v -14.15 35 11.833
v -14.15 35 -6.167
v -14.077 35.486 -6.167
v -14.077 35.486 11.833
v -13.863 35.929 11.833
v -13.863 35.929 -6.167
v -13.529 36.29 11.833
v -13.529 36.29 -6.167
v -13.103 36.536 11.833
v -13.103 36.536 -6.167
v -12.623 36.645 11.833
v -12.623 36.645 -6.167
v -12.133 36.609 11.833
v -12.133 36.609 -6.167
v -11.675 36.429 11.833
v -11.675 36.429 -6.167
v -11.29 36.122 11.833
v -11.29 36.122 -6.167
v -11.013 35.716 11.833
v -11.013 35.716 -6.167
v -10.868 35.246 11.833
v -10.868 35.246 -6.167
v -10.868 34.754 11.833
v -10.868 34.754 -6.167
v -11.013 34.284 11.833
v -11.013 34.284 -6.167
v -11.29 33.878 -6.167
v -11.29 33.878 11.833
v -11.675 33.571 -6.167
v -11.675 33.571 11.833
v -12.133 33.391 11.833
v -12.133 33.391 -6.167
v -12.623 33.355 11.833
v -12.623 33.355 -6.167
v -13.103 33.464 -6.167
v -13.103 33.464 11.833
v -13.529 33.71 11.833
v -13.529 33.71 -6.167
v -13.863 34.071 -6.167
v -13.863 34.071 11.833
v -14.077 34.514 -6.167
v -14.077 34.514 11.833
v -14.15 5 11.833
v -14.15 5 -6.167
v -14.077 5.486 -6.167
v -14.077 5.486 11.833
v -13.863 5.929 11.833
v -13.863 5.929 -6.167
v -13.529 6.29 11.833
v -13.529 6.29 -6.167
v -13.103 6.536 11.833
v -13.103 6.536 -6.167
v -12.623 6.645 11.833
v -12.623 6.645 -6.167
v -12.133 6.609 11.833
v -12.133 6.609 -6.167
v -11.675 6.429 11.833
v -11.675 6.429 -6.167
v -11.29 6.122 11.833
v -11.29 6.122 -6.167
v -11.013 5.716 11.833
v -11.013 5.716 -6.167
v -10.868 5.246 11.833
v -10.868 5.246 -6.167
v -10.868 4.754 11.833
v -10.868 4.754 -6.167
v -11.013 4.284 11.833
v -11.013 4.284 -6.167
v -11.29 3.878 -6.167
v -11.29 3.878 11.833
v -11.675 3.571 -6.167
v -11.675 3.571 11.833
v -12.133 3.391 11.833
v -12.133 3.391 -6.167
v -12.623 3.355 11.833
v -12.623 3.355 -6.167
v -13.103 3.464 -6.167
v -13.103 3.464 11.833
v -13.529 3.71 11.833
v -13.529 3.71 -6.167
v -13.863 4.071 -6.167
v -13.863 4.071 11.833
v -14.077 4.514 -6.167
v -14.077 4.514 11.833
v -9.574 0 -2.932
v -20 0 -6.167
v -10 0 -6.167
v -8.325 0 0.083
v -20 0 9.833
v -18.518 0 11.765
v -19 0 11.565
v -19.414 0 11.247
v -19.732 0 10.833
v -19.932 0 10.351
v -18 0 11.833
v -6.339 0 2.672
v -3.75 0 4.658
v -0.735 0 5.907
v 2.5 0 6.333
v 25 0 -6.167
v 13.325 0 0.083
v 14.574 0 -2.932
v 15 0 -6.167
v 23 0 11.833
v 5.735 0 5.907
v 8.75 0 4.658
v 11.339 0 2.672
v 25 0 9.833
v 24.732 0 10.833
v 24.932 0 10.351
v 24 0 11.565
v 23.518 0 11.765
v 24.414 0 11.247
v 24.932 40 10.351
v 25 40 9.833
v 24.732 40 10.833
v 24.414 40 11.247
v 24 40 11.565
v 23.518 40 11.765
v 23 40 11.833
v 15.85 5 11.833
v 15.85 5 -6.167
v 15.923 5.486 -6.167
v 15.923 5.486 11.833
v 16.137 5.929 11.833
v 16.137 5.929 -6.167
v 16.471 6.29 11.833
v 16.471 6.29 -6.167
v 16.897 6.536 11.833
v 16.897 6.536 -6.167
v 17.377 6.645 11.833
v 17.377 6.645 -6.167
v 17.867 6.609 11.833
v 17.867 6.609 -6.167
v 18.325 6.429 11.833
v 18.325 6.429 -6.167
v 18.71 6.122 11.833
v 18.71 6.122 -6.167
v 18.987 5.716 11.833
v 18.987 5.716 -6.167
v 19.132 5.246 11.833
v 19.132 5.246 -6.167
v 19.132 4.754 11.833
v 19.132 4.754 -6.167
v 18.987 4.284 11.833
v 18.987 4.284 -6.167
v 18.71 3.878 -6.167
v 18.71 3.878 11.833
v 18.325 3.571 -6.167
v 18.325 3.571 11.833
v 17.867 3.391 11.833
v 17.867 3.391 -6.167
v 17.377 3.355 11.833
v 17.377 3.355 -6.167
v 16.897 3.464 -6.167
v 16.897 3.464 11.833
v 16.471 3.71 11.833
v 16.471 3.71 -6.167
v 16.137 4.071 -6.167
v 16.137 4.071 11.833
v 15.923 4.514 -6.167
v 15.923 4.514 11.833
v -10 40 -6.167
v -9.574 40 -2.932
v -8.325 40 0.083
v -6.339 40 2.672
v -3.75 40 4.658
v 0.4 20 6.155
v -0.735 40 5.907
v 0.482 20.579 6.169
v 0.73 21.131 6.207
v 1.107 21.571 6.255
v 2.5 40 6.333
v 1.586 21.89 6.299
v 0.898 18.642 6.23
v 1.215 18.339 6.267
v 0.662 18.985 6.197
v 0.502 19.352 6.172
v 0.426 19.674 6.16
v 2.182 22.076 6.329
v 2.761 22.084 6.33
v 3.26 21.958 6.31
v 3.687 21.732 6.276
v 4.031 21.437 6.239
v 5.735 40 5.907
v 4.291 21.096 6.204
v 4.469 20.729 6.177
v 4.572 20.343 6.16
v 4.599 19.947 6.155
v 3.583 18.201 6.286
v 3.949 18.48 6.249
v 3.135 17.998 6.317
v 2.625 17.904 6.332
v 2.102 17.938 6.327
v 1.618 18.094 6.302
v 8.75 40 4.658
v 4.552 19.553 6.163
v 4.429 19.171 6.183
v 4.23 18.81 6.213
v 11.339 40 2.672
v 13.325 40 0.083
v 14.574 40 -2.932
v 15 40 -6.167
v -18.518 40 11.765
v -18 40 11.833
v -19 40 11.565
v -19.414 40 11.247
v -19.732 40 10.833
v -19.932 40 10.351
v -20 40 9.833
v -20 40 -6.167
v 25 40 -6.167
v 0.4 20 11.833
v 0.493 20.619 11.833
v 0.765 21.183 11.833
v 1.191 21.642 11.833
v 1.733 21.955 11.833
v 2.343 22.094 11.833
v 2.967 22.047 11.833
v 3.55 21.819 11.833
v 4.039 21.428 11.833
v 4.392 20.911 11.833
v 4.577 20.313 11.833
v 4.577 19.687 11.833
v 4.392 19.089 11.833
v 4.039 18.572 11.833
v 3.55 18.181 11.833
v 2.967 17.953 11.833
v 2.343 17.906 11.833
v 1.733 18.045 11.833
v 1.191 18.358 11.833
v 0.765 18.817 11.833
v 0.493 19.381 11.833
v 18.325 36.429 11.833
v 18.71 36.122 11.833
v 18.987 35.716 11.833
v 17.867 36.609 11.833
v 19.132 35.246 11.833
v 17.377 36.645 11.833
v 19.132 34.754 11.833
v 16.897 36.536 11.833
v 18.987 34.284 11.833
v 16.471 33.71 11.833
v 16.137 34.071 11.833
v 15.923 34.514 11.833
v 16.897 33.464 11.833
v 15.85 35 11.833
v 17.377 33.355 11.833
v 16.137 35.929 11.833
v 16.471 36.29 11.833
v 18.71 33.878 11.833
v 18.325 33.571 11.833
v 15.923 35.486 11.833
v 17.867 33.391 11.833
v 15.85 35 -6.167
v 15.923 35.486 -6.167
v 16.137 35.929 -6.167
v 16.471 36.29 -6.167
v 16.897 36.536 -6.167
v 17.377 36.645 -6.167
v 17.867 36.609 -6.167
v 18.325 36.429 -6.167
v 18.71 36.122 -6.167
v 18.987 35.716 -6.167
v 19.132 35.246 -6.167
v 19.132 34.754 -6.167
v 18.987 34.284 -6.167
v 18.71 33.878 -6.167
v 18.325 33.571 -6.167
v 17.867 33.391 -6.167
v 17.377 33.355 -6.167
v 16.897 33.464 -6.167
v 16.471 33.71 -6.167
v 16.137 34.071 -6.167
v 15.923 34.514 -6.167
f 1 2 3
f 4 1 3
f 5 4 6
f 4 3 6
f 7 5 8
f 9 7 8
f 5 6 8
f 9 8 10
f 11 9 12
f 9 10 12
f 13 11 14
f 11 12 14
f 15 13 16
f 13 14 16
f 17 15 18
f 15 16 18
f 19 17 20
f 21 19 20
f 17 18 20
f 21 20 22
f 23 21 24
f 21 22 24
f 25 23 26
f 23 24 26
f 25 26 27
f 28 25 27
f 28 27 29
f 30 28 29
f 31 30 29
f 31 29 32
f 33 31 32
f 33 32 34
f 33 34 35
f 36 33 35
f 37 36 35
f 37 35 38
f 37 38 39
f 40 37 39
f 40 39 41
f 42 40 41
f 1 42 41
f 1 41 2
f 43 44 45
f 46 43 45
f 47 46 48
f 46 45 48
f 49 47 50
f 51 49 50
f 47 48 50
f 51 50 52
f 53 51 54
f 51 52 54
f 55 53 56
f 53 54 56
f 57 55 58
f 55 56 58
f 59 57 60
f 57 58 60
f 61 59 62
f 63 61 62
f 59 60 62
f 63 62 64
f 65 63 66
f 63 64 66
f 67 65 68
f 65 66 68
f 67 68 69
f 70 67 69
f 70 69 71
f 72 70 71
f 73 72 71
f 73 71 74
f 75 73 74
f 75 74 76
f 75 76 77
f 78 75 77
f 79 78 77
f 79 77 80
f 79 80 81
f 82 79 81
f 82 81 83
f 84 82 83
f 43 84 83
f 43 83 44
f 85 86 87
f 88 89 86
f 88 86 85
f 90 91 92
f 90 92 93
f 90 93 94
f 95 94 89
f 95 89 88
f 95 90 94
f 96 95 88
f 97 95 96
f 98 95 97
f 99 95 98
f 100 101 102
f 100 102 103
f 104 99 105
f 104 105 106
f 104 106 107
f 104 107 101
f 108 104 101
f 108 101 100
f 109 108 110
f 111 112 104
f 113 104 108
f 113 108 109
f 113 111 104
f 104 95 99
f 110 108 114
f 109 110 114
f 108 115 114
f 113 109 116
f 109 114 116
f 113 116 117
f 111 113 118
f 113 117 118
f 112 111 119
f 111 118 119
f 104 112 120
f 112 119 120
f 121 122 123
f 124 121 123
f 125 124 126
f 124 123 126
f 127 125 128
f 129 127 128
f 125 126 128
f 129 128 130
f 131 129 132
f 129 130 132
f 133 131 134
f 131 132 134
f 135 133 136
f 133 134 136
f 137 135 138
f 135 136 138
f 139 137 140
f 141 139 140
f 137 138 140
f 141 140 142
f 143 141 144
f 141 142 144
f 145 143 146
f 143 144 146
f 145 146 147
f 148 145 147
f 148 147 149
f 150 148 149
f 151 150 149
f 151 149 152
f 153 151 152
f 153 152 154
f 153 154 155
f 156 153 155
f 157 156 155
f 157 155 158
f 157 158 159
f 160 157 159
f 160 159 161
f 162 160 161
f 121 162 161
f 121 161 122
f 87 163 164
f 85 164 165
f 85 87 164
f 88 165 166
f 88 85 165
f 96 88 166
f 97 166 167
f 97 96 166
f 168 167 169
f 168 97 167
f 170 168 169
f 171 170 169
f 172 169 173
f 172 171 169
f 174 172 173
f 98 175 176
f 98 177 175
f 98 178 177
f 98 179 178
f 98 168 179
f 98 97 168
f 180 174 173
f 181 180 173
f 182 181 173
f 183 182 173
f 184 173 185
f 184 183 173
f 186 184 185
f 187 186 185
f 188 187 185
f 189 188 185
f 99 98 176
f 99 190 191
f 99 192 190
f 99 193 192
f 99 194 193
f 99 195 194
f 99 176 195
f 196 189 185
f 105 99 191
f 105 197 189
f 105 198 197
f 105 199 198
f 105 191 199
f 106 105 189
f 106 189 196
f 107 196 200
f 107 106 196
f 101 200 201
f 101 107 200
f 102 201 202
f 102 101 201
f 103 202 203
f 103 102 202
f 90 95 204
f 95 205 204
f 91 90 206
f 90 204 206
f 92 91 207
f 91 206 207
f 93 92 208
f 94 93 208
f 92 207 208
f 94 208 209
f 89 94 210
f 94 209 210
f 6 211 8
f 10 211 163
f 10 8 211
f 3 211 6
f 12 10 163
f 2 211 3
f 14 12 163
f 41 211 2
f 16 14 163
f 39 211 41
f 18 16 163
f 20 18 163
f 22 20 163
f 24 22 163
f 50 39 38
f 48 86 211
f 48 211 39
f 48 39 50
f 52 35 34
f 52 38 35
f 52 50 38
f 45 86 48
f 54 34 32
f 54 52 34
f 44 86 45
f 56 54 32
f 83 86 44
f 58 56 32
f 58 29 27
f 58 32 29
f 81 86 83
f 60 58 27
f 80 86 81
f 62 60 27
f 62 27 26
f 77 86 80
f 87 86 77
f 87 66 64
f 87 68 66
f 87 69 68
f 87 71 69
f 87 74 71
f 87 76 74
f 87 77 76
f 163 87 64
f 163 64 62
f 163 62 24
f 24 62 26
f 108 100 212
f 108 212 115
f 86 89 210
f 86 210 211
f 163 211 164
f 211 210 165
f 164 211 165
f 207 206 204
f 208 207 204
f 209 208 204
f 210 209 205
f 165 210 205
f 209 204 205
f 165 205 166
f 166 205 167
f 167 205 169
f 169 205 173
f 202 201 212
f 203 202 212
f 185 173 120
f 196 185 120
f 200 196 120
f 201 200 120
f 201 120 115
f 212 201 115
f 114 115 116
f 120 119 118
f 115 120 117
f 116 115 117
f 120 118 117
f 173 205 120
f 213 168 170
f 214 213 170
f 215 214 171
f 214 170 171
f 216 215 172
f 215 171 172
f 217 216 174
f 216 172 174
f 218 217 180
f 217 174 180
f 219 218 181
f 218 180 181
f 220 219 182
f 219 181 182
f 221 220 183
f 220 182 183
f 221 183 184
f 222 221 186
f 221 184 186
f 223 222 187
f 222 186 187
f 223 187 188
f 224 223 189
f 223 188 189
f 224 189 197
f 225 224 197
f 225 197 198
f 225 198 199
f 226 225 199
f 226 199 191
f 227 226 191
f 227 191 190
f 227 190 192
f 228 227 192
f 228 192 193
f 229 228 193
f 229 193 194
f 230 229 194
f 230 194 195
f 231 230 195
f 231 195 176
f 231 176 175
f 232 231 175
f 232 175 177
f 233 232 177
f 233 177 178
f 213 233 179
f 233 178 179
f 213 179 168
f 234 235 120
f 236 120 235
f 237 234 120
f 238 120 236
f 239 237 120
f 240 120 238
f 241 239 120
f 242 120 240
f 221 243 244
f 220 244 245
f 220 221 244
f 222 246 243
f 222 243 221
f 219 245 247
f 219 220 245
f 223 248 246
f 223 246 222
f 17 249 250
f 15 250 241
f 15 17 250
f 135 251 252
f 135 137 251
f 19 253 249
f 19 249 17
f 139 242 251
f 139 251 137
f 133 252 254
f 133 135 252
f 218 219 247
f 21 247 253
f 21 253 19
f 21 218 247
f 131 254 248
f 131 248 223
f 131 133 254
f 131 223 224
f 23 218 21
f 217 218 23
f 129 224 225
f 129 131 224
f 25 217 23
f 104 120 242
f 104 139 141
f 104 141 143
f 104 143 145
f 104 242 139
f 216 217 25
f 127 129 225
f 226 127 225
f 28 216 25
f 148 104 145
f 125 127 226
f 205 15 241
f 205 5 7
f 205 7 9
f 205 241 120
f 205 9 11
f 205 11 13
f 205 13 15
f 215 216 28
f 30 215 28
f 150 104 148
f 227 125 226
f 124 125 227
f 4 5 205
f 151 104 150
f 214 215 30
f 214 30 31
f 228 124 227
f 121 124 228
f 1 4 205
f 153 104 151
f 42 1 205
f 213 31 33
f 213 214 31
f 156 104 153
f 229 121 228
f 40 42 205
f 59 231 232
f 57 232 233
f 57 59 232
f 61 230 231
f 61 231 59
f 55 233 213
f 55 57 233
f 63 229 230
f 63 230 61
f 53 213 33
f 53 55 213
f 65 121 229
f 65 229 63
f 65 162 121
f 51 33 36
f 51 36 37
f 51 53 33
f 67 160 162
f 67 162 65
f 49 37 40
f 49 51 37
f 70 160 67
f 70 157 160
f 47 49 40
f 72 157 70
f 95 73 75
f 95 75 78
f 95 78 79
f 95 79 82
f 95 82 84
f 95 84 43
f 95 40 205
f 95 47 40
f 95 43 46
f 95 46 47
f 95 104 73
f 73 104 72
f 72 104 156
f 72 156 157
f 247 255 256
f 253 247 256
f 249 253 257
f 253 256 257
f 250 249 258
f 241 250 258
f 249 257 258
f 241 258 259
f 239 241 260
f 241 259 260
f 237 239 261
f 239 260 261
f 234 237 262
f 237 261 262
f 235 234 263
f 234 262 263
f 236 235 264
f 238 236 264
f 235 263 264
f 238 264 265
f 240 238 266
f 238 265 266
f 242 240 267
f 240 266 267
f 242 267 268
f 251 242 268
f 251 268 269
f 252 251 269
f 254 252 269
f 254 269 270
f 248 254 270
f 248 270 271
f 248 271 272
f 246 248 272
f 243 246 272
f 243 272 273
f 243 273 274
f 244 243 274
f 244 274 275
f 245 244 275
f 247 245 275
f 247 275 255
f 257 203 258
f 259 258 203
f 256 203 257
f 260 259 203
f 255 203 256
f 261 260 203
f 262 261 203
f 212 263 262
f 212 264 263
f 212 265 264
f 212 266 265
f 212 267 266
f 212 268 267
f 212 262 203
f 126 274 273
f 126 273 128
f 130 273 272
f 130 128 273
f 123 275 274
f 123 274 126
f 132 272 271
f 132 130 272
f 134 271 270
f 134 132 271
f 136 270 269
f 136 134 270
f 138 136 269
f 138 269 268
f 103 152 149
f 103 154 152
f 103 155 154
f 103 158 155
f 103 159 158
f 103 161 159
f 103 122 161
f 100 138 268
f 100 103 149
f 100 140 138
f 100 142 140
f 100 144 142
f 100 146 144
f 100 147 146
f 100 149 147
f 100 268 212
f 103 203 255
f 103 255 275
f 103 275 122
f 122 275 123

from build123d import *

# Parameters (mm, degrees)
F1_DEPTH = 40
F3_D     = 3.3
F5_D     = 4.2
F6_R     = 2
F9_DEPTH = 3


with BuildPart() as f1:
    # F0 (on Front) → F1 (new body)
    with BuildSketch(Plane.XZ):
        with BuildLine():
            Line((15, -6.1671362493), (25, -6.1671362493))
            Line((25, -6.1671362493), (25, 11.8328637507))
            Line((25, 11.8328637507), (-20, 11.8328637507))
            Line((-20, 11.8328637507), (-20, -6.1671362493))
            Line((-20, -6.1671362493), (-10, -6.1671362493))
            ThreePointArc((-10, -6.1671362493), (2.5, 6.3328637507), (15, -6.1671362493))
        make_face()
    extrude(amount=-F1_DEPTH)

    # F3 (through all)
    with Locations(Plane.XY.offset(11.8328637507)):
        with Locations((-12.5, 5), (-12.5, 35), (17.5, 35), (17.5, 5)):
            Hole(F3_D / 2)

    # F5 (through all)
    with Locations(Plane.XY.offset(11.8328637507)):
        with Locations((2.5, 20)):
            Hole(F5_D / 2)

    # F6
    f6_edges = [f1.edges().sort_by_distance(p)[0] for p in [
        (-20, 20, 11.832864),
        (25, 20, 11.832864),
    ]]
    fillet(f6_edges, radius=F6_R)


with BuildPart() as f9:
    # F8 (on Top) → F9 (new body)
    with BuildSketch(Plane.XY):
        Polygon((57.5, 170.0064360575), (30, 217.6378332657), (-30, 217.6378332657), (-57.5, 170.0064360575), (-57.5, 30.0064360575), (-40, -0.3044530749), (40, -0.3044530749), (57.5, 30.0064360575), align=None)
    extrude(amount=F9_DEPTH)


solid = f1.part
